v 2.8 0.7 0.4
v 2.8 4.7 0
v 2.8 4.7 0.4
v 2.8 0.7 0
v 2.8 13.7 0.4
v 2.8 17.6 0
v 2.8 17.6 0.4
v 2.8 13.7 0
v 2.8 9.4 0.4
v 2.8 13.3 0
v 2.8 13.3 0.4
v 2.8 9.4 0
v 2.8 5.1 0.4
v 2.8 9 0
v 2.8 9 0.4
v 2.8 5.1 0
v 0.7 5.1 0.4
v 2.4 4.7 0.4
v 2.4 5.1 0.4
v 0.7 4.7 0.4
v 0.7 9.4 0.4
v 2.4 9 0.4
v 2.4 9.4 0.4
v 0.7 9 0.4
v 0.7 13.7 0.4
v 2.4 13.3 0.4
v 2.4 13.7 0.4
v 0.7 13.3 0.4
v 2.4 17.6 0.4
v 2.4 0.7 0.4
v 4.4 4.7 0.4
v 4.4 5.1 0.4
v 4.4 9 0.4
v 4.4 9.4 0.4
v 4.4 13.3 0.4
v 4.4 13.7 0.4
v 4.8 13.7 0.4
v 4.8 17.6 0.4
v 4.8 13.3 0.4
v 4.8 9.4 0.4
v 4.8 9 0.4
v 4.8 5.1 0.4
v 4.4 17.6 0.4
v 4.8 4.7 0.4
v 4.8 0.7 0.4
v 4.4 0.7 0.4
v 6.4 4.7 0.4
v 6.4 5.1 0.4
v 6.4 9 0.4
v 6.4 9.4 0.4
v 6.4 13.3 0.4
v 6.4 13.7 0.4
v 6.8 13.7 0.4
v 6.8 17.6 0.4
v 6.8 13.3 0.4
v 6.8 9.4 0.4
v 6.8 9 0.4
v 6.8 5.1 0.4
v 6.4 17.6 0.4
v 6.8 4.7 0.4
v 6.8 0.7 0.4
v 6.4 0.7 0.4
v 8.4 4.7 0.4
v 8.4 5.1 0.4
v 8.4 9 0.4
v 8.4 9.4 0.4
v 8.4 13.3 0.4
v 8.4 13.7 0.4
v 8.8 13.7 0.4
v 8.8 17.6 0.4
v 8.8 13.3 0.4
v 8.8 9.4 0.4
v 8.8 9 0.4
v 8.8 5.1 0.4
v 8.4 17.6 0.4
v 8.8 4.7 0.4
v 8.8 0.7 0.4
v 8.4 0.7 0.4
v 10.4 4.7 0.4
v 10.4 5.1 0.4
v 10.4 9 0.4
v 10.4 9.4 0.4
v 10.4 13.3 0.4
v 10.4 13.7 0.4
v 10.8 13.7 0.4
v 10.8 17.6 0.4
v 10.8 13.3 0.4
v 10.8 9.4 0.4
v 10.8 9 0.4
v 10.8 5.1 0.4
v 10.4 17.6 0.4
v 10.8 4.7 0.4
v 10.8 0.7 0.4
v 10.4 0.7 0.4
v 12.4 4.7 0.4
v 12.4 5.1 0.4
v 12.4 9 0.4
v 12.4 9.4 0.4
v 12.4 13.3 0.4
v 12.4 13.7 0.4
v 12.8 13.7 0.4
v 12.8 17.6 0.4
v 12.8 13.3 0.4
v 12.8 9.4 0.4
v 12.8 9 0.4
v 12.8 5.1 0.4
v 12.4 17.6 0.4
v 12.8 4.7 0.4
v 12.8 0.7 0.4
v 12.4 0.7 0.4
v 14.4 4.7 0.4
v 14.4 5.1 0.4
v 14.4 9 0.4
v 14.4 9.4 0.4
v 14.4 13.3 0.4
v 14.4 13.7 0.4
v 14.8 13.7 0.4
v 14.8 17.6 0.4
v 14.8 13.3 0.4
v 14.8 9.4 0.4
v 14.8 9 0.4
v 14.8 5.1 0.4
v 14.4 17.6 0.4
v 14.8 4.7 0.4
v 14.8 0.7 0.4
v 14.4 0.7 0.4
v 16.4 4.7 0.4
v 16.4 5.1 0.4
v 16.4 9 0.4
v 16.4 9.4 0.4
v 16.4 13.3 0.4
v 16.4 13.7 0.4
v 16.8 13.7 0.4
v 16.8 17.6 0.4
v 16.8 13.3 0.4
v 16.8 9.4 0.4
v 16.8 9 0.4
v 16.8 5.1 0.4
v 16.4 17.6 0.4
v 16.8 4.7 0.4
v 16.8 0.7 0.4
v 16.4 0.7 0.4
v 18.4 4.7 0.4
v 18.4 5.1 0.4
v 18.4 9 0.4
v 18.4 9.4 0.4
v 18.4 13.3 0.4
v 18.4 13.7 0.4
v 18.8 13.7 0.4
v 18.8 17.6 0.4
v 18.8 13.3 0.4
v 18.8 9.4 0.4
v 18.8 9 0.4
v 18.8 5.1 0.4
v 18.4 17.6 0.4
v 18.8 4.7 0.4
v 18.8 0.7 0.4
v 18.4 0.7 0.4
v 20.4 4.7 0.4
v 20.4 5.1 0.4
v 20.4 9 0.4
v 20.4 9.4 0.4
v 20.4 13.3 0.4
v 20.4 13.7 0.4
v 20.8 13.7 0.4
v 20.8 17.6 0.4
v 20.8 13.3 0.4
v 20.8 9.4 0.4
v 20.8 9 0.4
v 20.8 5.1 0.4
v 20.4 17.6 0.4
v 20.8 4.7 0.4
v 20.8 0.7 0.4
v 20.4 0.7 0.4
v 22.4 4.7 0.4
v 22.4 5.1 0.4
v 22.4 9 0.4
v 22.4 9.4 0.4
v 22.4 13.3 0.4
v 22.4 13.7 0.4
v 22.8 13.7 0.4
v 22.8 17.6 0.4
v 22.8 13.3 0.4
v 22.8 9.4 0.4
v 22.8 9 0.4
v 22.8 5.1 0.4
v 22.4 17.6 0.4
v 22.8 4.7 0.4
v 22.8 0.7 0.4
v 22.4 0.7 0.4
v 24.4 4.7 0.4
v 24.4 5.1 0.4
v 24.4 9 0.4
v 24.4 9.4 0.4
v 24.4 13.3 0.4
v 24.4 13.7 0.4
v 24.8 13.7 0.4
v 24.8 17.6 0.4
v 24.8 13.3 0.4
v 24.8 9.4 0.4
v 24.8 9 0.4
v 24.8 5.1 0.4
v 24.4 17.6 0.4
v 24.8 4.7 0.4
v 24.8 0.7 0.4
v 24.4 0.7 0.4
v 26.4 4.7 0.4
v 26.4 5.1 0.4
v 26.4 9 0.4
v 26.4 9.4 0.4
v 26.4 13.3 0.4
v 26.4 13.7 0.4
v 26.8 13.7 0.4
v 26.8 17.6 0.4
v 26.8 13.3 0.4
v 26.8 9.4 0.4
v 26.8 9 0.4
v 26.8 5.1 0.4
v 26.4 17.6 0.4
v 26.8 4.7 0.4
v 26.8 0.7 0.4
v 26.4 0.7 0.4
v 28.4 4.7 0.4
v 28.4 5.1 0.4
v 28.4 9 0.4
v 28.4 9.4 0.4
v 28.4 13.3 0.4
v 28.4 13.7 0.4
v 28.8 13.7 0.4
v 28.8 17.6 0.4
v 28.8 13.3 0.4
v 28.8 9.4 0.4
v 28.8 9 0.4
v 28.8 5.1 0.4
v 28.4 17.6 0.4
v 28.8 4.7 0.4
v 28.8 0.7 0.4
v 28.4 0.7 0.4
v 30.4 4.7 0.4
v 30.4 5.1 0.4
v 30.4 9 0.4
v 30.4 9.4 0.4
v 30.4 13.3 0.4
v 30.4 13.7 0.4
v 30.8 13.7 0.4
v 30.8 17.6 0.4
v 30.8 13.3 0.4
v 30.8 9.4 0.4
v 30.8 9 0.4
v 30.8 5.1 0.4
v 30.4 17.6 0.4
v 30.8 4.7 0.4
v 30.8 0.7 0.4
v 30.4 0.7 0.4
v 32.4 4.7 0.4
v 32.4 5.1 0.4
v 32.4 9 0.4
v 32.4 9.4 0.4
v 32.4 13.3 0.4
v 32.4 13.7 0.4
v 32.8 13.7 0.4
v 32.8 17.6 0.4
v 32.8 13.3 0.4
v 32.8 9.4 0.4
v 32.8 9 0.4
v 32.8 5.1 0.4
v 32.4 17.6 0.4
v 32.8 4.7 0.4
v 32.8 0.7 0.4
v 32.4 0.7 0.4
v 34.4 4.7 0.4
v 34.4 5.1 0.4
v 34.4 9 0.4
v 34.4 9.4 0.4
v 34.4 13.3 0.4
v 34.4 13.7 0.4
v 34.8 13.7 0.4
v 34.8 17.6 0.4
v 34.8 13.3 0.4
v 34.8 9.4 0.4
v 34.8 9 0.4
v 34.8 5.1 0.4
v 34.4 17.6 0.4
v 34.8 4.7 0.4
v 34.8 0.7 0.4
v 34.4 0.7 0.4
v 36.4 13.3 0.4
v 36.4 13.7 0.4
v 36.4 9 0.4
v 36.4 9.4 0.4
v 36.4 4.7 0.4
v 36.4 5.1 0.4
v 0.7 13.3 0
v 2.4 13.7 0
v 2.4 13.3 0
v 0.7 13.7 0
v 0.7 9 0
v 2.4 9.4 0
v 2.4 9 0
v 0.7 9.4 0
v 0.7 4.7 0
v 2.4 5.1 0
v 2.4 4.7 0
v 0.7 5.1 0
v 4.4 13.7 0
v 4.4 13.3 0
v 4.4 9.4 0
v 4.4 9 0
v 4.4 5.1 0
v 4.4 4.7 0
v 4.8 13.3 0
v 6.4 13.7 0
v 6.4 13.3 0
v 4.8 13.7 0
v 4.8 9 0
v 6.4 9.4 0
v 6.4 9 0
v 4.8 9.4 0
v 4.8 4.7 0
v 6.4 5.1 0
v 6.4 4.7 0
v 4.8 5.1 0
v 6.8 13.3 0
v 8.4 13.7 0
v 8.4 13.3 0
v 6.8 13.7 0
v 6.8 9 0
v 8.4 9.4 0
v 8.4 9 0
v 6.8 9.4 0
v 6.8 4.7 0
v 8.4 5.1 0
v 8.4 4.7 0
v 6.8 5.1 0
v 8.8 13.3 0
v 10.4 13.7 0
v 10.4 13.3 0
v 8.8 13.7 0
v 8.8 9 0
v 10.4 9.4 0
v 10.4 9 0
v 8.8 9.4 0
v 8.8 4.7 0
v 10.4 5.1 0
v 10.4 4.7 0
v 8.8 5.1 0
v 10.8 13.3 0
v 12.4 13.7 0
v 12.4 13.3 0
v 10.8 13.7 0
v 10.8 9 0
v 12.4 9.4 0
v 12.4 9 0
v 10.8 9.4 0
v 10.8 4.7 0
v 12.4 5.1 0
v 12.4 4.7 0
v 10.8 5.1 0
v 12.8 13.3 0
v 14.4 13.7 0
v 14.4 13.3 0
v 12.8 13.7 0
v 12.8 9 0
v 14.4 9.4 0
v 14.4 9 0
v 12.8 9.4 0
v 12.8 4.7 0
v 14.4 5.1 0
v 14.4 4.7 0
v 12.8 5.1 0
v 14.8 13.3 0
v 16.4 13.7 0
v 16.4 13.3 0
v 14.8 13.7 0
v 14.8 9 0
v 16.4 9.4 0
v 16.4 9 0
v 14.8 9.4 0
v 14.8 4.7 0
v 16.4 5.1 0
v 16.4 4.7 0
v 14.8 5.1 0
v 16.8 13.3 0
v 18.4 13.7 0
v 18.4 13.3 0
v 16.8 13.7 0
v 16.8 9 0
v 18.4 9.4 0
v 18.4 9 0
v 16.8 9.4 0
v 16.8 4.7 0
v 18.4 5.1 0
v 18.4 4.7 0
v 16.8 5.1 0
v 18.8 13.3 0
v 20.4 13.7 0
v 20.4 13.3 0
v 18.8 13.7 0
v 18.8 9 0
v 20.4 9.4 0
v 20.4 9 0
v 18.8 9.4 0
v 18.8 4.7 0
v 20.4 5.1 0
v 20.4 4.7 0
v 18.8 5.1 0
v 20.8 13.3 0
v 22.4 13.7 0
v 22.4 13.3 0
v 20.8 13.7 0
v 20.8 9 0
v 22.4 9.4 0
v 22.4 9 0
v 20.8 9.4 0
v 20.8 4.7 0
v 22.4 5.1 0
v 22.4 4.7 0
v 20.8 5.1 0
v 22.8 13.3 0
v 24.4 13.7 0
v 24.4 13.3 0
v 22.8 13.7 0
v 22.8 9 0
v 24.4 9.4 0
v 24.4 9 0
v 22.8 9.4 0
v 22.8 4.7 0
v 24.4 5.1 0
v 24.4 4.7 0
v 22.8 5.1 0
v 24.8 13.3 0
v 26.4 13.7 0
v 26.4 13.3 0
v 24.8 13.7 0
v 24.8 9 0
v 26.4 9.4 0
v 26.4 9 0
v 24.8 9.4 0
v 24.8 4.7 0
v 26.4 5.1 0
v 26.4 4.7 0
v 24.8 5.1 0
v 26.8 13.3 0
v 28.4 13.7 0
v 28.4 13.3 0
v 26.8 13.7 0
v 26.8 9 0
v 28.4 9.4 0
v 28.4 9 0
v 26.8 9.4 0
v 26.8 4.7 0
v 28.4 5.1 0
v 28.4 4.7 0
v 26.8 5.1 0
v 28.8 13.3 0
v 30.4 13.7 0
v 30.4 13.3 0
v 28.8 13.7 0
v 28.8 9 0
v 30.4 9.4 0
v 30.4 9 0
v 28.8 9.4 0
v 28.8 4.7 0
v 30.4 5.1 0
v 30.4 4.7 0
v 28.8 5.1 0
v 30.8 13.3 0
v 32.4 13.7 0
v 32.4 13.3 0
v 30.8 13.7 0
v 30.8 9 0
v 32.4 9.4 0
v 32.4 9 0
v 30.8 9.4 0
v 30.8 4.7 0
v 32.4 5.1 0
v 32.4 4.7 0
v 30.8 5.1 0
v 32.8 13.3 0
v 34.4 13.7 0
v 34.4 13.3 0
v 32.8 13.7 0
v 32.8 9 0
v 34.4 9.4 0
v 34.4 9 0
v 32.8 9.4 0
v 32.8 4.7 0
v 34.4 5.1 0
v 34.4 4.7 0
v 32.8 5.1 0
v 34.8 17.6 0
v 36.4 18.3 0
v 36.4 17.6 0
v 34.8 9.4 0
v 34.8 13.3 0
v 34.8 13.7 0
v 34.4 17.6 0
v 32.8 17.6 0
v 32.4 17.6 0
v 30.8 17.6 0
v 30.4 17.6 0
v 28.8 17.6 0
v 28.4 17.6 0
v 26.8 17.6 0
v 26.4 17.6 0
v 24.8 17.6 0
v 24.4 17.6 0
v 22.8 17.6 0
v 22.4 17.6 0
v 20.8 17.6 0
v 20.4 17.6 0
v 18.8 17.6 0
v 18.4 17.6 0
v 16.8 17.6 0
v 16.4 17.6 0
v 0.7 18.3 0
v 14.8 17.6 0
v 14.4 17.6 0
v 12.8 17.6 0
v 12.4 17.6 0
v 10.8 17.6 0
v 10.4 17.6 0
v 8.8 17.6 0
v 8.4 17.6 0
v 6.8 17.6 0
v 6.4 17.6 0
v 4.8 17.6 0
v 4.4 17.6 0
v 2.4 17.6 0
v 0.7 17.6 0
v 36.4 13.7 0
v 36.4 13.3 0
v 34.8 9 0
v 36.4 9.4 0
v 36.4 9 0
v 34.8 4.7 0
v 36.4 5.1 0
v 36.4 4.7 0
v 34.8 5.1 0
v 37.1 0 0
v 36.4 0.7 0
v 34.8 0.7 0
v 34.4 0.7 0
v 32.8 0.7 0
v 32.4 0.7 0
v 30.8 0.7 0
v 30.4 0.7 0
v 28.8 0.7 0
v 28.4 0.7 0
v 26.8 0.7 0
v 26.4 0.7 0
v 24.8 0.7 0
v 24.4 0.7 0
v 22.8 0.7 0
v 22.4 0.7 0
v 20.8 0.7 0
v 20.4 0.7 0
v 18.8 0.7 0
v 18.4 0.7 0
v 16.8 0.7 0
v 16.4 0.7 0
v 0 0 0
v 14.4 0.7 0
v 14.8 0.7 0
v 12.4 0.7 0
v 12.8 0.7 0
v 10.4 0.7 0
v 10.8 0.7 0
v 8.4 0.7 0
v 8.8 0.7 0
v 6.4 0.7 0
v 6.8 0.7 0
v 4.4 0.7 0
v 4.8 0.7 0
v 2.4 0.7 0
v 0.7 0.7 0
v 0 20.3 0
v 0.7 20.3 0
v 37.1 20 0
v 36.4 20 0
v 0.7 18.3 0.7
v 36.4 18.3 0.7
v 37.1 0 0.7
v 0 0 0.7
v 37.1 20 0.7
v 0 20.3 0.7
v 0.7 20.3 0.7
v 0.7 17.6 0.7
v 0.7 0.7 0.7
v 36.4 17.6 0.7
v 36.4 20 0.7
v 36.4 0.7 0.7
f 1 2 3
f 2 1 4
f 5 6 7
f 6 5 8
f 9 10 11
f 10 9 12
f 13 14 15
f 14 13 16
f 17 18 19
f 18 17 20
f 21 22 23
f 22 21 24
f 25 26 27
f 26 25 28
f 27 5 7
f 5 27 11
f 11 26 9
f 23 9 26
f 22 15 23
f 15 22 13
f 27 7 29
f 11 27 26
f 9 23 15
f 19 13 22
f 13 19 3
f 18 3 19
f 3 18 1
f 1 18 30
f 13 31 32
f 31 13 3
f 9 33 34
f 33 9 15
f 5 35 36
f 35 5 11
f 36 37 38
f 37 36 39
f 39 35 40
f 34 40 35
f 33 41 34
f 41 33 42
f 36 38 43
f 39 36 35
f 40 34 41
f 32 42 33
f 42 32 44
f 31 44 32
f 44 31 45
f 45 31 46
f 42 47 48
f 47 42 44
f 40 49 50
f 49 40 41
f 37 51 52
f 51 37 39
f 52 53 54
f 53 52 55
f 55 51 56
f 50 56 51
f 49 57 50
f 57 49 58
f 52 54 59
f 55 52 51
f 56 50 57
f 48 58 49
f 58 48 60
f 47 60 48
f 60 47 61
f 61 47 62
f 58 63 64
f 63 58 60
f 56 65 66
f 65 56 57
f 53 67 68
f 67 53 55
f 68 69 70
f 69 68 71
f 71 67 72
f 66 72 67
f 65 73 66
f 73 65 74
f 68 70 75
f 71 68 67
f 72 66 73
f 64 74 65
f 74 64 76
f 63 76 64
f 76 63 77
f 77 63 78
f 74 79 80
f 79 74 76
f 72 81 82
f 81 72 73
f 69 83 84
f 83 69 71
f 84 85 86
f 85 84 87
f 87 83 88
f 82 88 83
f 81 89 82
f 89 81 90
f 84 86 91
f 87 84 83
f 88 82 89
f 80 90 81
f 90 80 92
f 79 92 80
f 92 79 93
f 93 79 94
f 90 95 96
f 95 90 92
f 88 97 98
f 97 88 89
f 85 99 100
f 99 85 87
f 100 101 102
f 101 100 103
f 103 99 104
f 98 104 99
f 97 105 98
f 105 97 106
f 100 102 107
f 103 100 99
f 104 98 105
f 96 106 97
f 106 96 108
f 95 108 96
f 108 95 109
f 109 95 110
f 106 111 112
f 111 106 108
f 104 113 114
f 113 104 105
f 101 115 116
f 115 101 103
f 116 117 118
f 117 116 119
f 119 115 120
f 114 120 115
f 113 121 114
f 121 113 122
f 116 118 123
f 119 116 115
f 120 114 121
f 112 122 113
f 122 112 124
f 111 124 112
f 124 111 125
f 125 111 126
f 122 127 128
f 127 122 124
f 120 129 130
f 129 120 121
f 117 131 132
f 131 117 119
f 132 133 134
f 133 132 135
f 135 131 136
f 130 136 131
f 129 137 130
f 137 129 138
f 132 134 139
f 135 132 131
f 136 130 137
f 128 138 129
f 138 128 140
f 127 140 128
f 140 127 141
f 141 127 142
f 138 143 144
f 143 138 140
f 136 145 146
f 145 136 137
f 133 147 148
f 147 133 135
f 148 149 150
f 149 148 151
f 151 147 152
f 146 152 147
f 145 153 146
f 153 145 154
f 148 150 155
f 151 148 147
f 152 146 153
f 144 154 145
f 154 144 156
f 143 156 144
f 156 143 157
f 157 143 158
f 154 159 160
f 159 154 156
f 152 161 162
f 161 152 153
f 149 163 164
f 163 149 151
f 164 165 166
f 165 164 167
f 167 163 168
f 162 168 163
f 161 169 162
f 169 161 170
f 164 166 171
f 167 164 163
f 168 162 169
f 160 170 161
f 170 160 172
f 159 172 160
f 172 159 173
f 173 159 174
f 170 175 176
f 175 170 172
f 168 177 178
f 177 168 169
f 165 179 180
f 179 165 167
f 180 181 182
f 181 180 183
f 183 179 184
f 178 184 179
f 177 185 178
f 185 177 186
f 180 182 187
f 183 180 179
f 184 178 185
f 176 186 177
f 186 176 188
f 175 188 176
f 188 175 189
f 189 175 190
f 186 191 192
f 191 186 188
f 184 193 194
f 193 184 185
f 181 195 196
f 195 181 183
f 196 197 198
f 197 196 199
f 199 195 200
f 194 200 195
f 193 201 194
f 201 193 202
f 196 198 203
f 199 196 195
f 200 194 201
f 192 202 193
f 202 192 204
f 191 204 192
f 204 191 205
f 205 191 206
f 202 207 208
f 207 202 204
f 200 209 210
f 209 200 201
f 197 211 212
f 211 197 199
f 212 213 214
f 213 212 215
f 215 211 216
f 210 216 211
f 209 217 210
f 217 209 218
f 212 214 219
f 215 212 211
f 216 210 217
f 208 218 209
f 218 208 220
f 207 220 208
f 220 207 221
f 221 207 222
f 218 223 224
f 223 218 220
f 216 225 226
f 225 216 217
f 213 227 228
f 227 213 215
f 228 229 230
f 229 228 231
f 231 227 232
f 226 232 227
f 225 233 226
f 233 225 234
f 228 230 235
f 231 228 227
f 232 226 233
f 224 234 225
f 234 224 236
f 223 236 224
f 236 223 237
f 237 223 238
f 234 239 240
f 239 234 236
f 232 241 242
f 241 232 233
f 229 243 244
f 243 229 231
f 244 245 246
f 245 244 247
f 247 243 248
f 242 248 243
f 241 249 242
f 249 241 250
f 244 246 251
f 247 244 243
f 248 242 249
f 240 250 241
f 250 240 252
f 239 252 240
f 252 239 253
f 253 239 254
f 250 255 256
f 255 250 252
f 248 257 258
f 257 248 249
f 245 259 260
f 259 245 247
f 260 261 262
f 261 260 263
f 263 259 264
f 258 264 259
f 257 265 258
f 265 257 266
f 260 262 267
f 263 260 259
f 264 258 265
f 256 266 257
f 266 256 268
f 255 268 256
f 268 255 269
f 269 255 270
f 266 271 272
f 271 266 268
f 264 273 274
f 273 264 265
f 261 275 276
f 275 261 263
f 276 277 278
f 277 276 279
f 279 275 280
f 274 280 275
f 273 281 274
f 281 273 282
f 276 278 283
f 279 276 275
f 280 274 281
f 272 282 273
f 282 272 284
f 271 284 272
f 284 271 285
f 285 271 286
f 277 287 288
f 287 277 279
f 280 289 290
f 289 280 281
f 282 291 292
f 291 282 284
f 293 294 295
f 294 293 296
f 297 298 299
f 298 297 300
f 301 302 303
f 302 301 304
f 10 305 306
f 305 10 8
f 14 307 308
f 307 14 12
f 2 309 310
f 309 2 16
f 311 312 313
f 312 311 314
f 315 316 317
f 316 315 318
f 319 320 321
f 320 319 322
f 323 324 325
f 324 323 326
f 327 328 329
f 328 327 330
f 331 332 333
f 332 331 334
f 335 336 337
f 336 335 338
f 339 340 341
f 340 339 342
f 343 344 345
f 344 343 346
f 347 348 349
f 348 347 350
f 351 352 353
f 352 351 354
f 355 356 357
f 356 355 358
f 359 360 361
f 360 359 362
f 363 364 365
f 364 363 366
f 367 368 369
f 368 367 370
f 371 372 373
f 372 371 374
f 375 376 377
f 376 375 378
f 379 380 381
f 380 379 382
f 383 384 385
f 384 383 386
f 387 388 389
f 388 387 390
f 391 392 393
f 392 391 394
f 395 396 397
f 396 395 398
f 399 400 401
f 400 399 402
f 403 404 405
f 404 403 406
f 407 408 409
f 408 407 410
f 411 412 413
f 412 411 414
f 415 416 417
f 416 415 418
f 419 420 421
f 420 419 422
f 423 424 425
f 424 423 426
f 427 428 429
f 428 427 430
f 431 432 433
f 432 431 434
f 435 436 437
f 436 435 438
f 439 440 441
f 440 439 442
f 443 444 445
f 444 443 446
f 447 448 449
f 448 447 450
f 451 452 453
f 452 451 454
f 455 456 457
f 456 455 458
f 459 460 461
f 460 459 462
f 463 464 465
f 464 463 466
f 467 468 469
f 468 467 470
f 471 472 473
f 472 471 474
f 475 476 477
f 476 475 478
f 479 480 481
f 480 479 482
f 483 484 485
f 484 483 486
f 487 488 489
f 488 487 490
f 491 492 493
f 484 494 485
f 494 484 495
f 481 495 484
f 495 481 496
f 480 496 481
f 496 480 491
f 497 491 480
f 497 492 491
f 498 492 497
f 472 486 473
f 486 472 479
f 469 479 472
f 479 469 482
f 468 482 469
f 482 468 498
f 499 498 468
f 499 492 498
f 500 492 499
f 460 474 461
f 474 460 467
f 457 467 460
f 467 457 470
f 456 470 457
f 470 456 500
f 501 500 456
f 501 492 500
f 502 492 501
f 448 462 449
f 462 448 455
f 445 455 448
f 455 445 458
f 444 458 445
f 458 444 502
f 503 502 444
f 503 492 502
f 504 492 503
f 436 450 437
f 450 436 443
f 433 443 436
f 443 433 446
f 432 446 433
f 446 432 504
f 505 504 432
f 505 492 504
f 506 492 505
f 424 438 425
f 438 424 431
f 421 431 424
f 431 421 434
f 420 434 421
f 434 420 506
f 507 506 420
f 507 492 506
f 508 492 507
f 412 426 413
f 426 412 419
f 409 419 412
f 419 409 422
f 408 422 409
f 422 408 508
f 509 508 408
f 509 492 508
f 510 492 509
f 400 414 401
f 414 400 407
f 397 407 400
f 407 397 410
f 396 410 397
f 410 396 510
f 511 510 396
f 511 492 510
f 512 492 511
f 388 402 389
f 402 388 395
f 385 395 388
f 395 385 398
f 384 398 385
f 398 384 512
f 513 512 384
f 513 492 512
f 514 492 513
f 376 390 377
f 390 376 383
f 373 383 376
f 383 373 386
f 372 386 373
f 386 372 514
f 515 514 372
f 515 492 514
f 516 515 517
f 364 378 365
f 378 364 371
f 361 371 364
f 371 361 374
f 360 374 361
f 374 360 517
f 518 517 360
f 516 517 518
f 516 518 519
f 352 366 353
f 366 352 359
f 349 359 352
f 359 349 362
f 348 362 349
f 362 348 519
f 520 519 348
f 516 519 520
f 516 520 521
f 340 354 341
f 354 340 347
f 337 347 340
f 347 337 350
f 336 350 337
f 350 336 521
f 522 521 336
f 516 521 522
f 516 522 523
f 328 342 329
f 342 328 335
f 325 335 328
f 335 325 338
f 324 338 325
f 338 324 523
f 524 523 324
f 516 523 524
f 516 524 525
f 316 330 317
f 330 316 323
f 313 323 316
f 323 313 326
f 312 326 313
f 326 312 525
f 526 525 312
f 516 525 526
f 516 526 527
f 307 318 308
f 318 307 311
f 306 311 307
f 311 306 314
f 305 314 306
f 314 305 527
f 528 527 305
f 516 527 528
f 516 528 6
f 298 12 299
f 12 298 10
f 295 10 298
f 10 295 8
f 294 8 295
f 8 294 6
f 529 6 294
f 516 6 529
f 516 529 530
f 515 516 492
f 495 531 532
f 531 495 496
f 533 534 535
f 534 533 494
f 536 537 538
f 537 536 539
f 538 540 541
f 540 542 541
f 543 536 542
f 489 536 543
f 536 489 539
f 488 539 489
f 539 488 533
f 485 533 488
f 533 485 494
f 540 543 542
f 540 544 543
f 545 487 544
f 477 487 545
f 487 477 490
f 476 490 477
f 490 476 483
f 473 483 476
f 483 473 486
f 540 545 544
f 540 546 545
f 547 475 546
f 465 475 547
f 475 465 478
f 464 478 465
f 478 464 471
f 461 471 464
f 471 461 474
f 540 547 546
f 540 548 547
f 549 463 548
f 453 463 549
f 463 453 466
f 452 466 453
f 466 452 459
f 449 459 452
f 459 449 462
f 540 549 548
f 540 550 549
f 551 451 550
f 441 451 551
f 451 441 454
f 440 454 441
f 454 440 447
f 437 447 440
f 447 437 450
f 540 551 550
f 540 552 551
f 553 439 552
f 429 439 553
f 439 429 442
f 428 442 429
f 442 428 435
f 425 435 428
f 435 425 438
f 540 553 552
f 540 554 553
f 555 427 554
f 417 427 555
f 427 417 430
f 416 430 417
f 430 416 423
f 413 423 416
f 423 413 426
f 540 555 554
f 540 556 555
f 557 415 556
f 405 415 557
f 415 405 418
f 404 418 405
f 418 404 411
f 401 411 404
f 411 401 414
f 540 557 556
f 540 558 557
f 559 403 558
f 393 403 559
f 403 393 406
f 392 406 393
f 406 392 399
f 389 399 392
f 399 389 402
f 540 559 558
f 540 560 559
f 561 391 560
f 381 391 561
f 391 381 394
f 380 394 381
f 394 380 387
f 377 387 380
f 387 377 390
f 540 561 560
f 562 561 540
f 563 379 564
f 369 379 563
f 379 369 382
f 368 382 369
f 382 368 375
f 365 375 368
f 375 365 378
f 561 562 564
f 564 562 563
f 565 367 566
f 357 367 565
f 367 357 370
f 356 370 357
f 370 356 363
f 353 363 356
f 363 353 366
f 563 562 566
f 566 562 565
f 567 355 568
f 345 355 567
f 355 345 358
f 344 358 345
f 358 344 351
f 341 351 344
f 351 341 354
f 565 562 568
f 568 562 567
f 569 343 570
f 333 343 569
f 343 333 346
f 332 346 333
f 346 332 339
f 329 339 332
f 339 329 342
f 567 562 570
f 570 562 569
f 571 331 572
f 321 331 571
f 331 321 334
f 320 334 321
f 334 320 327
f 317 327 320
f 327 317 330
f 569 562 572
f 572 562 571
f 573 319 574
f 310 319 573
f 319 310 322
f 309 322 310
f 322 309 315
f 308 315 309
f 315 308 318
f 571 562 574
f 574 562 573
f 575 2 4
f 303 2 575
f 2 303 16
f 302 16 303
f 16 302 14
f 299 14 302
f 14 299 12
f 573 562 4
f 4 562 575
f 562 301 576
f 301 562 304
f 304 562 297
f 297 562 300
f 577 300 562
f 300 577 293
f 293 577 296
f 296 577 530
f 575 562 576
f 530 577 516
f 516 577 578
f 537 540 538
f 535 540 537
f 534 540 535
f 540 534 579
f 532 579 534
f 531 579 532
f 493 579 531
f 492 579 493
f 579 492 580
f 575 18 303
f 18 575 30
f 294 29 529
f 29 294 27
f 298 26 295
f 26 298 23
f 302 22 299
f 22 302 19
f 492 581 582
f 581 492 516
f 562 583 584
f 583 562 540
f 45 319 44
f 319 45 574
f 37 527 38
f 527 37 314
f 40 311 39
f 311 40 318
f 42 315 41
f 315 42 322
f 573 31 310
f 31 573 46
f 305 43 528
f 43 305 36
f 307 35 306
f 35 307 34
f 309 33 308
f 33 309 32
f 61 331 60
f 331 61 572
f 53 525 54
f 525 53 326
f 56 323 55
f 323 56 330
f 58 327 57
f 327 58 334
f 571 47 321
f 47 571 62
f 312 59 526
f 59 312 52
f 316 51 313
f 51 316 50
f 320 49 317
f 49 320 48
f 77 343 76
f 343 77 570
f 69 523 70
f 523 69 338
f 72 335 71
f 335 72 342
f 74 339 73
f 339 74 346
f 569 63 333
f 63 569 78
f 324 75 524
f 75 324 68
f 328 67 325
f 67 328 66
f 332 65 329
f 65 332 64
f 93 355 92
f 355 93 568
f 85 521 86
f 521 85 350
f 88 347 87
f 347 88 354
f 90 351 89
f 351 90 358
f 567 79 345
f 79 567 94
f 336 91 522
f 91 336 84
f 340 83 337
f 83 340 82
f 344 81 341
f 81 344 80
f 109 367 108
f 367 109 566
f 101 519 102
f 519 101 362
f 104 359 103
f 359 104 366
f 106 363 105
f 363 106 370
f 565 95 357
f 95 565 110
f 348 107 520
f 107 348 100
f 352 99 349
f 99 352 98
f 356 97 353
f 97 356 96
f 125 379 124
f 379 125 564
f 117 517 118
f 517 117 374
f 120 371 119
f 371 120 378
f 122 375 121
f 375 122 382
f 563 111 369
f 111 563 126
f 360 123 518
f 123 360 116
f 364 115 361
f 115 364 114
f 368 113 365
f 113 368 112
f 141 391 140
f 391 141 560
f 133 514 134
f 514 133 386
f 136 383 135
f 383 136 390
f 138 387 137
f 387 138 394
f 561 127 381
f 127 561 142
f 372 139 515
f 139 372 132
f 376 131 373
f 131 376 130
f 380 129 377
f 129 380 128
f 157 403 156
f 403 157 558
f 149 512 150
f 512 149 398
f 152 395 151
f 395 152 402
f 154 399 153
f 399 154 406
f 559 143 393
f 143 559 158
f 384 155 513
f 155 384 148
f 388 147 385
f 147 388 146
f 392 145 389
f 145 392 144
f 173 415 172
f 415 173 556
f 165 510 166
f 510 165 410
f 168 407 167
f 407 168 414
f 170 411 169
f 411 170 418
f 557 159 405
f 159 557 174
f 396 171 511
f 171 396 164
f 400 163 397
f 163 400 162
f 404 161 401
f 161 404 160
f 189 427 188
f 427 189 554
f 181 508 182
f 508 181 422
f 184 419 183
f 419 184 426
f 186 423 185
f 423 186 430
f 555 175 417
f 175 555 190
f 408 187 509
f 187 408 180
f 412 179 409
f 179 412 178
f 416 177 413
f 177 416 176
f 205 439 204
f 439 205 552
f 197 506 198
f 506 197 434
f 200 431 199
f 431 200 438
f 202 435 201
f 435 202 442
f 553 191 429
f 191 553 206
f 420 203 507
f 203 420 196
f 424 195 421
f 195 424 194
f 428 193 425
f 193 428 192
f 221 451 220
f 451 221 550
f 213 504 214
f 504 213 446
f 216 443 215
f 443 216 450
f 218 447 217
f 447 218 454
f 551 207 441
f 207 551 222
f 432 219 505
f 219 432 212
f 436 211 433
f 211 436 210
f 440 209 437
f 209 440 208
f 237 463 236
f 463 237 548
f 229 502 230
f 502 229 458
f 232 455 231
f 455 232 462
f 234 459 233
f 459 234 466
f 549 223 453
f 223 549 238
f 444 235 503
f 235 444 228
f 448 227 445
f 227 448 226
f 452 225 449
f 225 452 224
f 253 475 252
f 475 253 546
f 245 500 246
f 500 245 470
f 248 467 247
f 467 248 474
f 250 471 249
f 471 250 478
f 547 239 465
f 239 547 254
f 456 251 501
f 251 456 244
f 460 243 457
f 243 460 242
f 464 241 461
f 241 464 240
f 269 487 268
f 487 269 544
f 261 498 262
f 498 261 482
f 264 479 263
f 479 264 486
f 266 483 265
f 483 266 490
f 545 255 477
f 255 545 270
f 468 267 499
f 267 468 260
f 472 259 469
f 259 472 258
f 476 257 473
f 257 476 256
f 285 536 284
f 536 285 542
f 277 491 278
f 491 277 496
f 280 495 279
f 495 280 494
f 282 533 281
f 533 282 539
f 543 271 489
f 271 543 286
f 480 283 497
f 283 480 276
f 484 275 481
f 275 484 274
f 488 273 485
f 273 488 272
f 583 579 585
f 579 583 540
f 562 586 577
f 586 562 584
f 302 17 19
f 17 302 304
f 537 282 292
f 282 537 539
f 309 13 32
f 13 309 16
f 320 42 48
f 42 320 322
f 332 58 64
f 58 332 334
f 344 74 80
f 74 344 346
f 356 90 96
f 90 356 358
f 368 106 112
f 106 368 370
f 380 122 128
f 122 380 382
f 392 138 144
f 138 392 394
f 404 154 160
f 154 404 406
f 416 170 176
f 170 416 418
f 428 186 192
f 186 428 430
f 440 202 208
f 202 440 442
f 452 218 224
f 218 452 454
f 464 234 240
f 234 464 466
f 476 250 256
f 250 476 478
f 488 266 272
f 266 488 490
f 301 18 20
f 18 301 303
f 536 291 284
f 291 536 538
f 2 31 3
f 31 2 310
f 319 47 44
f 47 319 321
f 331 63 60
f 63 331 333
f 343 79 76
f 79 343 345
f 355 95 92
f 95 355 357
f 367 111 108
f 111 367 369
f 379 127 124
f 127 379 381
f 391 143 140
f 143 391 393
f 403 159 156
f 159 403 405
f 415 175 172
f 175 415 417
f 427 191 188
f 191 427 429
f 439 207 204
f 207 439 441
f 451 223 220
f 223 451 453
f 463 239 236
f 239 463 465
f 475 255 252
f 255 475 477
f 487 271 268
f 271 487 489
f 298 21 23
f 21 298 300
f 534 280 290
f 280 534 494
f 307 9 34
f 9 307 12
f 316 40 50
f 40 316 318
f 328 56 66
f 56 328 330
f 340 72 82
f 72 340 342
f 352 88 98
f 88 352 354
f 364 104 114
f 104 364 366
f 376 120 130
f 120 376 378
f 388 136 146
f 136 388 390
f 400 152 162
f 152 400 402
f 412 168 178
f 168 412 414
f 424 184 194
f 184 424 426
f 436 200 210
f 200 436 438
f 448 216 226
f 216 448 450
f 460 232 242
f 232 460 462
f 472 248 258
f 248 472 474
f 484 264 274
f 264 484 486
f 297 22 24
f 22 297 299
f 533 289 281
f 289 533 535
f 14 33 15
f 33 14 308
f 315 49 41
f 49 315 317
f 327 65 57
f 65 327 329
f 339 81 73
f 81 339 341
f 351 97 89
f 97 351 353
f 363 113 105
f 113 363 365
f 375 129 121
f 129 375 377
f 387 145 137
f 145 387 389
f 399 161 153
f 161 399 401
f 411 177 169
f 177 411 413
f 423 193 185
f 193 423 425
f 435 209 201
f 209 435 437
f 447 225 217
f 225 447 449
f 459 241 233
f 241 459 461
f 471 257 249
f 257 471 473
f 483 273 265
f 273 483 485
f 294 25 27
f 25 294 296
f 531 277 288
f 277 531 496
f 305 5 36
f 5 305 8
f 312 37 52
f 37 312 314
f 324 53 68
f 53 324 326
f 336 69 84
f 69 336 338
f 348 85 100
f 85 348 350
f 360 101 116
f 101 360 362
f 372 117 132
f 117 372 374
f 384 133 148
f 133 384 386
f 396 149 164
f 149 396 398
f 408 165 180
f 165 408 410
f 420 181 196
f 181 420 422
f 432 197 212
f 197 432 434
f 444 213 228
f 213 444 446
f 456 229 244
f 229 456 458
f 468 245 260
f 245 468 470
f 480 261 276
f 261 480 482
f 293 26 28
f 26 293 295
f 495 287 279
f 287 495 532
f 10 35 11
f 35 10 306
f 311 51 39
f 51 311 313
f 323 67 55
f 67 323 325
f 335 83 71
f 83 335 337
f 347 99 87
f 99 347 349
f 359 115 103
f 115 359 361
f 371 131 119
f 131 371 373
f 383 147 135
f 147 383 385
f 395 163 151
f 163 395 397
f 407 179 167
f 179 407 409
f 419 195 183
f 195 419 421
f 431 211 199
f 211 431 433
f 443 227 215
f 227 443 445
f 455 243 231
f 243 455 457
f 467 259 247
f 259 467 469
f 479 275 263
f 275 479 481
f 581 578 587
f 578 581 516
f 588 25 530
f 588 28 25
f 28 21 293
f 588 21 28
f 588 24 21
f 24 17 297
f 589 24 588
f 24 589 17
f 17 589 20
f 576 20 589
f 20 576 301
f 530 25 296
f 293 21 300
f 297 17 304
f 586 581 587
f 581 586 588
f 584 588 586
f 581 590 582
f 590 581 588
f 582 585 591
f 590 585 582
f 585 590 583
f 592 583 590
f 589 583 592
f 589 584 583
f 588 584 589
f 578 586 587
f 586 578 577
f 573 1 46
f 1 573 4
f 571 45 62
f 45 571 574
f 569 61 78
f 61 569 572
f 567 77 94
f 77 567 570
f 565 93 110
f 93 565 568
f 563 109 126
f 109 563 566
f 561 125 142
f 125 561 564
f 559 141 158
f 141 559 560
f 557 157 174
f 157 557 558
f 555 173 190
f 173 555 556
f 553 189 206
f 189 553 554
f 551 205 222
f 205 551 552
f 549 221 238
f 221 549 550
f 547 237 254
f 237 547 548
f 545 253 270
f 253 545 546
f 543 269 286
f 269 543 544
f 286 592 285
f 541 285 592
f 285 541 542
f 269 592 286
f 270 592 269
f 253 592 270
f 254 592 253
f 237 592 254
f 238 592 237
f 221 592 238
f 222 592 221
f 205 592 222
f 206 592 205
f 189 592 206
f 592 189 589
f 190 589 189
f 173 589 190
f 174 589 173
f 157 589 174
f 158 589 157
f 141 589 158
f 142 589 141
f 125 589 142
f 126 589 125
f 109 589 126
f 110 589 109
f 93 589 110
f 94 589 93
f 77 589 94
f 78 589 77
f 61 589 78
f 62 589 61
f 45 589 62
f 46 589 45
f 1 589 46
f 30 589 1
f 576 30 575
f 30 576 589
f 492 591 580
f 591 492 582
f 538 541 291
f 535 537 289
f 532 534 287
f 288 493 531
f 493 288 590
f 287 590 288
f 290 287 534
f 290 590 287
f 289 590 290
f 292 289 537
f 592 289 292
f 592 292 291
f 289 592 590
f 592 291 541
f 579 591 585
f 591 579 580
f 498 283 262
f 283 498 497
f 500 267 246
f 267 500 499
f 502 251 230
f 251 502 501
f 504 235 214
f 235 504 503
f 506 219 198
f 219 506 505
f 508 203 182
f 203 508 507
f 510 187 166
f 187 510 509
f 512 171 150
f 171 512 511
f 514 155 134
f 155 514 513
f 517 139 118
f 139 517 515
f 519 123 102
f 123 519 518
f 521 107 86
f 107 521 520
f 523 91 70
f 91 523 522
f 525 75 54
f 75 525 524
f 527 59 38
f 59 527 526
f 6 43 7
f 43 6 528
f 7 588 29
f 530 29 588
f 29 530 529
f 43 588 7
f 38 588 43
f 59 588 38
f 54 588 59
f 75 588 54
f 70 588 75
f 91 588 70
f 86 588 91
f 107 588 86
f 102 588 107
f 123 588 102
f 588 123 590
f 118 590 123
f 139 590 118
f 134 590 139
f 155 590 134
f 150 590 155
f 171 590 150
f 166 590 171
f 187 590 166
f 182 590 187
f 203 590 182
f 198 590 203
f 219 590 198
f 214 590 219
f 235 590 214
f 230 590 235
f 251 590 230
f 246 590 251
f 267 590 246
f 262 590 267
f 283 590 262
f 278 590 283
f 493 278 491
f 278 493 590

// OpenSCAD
rowcnt=4;
rowspace=4;
barcnt=18;
barspace=1.7;
innerwid=0.3;
outerwid=0.7;
pilelen=2;


totwidth=barcnt*(barspace+innerwid)-innerwid+2*outerwid;
totheight=rowcnt*(rowspace+innerwid)-innerwid+2*outerwid;

cube([outerwid,totheight+pilelen,outerwid]);
cube([totwidth,outerwid,outerwid]);
for (xpos = [1:barcnt-1]) {
    translate([xpos*(barspace+innerwid)-innerwid+outerwid,0,0]) cube([0.4,totheight,0.4]);    
}
for (ypos = [1:rowcnt-1]) {
    translate([0,ypos*(rowspace+innerwid)-innerwid+outerwid,0]) cube([totwidth,0.4,0.4]);    
}
translate([totwidth-outerwid,0,0]) cube([outerwid,20,outerwid]);

translate([0,totheight-outerwid,0]) cube([totwidth,outerwid,outerwid]);
